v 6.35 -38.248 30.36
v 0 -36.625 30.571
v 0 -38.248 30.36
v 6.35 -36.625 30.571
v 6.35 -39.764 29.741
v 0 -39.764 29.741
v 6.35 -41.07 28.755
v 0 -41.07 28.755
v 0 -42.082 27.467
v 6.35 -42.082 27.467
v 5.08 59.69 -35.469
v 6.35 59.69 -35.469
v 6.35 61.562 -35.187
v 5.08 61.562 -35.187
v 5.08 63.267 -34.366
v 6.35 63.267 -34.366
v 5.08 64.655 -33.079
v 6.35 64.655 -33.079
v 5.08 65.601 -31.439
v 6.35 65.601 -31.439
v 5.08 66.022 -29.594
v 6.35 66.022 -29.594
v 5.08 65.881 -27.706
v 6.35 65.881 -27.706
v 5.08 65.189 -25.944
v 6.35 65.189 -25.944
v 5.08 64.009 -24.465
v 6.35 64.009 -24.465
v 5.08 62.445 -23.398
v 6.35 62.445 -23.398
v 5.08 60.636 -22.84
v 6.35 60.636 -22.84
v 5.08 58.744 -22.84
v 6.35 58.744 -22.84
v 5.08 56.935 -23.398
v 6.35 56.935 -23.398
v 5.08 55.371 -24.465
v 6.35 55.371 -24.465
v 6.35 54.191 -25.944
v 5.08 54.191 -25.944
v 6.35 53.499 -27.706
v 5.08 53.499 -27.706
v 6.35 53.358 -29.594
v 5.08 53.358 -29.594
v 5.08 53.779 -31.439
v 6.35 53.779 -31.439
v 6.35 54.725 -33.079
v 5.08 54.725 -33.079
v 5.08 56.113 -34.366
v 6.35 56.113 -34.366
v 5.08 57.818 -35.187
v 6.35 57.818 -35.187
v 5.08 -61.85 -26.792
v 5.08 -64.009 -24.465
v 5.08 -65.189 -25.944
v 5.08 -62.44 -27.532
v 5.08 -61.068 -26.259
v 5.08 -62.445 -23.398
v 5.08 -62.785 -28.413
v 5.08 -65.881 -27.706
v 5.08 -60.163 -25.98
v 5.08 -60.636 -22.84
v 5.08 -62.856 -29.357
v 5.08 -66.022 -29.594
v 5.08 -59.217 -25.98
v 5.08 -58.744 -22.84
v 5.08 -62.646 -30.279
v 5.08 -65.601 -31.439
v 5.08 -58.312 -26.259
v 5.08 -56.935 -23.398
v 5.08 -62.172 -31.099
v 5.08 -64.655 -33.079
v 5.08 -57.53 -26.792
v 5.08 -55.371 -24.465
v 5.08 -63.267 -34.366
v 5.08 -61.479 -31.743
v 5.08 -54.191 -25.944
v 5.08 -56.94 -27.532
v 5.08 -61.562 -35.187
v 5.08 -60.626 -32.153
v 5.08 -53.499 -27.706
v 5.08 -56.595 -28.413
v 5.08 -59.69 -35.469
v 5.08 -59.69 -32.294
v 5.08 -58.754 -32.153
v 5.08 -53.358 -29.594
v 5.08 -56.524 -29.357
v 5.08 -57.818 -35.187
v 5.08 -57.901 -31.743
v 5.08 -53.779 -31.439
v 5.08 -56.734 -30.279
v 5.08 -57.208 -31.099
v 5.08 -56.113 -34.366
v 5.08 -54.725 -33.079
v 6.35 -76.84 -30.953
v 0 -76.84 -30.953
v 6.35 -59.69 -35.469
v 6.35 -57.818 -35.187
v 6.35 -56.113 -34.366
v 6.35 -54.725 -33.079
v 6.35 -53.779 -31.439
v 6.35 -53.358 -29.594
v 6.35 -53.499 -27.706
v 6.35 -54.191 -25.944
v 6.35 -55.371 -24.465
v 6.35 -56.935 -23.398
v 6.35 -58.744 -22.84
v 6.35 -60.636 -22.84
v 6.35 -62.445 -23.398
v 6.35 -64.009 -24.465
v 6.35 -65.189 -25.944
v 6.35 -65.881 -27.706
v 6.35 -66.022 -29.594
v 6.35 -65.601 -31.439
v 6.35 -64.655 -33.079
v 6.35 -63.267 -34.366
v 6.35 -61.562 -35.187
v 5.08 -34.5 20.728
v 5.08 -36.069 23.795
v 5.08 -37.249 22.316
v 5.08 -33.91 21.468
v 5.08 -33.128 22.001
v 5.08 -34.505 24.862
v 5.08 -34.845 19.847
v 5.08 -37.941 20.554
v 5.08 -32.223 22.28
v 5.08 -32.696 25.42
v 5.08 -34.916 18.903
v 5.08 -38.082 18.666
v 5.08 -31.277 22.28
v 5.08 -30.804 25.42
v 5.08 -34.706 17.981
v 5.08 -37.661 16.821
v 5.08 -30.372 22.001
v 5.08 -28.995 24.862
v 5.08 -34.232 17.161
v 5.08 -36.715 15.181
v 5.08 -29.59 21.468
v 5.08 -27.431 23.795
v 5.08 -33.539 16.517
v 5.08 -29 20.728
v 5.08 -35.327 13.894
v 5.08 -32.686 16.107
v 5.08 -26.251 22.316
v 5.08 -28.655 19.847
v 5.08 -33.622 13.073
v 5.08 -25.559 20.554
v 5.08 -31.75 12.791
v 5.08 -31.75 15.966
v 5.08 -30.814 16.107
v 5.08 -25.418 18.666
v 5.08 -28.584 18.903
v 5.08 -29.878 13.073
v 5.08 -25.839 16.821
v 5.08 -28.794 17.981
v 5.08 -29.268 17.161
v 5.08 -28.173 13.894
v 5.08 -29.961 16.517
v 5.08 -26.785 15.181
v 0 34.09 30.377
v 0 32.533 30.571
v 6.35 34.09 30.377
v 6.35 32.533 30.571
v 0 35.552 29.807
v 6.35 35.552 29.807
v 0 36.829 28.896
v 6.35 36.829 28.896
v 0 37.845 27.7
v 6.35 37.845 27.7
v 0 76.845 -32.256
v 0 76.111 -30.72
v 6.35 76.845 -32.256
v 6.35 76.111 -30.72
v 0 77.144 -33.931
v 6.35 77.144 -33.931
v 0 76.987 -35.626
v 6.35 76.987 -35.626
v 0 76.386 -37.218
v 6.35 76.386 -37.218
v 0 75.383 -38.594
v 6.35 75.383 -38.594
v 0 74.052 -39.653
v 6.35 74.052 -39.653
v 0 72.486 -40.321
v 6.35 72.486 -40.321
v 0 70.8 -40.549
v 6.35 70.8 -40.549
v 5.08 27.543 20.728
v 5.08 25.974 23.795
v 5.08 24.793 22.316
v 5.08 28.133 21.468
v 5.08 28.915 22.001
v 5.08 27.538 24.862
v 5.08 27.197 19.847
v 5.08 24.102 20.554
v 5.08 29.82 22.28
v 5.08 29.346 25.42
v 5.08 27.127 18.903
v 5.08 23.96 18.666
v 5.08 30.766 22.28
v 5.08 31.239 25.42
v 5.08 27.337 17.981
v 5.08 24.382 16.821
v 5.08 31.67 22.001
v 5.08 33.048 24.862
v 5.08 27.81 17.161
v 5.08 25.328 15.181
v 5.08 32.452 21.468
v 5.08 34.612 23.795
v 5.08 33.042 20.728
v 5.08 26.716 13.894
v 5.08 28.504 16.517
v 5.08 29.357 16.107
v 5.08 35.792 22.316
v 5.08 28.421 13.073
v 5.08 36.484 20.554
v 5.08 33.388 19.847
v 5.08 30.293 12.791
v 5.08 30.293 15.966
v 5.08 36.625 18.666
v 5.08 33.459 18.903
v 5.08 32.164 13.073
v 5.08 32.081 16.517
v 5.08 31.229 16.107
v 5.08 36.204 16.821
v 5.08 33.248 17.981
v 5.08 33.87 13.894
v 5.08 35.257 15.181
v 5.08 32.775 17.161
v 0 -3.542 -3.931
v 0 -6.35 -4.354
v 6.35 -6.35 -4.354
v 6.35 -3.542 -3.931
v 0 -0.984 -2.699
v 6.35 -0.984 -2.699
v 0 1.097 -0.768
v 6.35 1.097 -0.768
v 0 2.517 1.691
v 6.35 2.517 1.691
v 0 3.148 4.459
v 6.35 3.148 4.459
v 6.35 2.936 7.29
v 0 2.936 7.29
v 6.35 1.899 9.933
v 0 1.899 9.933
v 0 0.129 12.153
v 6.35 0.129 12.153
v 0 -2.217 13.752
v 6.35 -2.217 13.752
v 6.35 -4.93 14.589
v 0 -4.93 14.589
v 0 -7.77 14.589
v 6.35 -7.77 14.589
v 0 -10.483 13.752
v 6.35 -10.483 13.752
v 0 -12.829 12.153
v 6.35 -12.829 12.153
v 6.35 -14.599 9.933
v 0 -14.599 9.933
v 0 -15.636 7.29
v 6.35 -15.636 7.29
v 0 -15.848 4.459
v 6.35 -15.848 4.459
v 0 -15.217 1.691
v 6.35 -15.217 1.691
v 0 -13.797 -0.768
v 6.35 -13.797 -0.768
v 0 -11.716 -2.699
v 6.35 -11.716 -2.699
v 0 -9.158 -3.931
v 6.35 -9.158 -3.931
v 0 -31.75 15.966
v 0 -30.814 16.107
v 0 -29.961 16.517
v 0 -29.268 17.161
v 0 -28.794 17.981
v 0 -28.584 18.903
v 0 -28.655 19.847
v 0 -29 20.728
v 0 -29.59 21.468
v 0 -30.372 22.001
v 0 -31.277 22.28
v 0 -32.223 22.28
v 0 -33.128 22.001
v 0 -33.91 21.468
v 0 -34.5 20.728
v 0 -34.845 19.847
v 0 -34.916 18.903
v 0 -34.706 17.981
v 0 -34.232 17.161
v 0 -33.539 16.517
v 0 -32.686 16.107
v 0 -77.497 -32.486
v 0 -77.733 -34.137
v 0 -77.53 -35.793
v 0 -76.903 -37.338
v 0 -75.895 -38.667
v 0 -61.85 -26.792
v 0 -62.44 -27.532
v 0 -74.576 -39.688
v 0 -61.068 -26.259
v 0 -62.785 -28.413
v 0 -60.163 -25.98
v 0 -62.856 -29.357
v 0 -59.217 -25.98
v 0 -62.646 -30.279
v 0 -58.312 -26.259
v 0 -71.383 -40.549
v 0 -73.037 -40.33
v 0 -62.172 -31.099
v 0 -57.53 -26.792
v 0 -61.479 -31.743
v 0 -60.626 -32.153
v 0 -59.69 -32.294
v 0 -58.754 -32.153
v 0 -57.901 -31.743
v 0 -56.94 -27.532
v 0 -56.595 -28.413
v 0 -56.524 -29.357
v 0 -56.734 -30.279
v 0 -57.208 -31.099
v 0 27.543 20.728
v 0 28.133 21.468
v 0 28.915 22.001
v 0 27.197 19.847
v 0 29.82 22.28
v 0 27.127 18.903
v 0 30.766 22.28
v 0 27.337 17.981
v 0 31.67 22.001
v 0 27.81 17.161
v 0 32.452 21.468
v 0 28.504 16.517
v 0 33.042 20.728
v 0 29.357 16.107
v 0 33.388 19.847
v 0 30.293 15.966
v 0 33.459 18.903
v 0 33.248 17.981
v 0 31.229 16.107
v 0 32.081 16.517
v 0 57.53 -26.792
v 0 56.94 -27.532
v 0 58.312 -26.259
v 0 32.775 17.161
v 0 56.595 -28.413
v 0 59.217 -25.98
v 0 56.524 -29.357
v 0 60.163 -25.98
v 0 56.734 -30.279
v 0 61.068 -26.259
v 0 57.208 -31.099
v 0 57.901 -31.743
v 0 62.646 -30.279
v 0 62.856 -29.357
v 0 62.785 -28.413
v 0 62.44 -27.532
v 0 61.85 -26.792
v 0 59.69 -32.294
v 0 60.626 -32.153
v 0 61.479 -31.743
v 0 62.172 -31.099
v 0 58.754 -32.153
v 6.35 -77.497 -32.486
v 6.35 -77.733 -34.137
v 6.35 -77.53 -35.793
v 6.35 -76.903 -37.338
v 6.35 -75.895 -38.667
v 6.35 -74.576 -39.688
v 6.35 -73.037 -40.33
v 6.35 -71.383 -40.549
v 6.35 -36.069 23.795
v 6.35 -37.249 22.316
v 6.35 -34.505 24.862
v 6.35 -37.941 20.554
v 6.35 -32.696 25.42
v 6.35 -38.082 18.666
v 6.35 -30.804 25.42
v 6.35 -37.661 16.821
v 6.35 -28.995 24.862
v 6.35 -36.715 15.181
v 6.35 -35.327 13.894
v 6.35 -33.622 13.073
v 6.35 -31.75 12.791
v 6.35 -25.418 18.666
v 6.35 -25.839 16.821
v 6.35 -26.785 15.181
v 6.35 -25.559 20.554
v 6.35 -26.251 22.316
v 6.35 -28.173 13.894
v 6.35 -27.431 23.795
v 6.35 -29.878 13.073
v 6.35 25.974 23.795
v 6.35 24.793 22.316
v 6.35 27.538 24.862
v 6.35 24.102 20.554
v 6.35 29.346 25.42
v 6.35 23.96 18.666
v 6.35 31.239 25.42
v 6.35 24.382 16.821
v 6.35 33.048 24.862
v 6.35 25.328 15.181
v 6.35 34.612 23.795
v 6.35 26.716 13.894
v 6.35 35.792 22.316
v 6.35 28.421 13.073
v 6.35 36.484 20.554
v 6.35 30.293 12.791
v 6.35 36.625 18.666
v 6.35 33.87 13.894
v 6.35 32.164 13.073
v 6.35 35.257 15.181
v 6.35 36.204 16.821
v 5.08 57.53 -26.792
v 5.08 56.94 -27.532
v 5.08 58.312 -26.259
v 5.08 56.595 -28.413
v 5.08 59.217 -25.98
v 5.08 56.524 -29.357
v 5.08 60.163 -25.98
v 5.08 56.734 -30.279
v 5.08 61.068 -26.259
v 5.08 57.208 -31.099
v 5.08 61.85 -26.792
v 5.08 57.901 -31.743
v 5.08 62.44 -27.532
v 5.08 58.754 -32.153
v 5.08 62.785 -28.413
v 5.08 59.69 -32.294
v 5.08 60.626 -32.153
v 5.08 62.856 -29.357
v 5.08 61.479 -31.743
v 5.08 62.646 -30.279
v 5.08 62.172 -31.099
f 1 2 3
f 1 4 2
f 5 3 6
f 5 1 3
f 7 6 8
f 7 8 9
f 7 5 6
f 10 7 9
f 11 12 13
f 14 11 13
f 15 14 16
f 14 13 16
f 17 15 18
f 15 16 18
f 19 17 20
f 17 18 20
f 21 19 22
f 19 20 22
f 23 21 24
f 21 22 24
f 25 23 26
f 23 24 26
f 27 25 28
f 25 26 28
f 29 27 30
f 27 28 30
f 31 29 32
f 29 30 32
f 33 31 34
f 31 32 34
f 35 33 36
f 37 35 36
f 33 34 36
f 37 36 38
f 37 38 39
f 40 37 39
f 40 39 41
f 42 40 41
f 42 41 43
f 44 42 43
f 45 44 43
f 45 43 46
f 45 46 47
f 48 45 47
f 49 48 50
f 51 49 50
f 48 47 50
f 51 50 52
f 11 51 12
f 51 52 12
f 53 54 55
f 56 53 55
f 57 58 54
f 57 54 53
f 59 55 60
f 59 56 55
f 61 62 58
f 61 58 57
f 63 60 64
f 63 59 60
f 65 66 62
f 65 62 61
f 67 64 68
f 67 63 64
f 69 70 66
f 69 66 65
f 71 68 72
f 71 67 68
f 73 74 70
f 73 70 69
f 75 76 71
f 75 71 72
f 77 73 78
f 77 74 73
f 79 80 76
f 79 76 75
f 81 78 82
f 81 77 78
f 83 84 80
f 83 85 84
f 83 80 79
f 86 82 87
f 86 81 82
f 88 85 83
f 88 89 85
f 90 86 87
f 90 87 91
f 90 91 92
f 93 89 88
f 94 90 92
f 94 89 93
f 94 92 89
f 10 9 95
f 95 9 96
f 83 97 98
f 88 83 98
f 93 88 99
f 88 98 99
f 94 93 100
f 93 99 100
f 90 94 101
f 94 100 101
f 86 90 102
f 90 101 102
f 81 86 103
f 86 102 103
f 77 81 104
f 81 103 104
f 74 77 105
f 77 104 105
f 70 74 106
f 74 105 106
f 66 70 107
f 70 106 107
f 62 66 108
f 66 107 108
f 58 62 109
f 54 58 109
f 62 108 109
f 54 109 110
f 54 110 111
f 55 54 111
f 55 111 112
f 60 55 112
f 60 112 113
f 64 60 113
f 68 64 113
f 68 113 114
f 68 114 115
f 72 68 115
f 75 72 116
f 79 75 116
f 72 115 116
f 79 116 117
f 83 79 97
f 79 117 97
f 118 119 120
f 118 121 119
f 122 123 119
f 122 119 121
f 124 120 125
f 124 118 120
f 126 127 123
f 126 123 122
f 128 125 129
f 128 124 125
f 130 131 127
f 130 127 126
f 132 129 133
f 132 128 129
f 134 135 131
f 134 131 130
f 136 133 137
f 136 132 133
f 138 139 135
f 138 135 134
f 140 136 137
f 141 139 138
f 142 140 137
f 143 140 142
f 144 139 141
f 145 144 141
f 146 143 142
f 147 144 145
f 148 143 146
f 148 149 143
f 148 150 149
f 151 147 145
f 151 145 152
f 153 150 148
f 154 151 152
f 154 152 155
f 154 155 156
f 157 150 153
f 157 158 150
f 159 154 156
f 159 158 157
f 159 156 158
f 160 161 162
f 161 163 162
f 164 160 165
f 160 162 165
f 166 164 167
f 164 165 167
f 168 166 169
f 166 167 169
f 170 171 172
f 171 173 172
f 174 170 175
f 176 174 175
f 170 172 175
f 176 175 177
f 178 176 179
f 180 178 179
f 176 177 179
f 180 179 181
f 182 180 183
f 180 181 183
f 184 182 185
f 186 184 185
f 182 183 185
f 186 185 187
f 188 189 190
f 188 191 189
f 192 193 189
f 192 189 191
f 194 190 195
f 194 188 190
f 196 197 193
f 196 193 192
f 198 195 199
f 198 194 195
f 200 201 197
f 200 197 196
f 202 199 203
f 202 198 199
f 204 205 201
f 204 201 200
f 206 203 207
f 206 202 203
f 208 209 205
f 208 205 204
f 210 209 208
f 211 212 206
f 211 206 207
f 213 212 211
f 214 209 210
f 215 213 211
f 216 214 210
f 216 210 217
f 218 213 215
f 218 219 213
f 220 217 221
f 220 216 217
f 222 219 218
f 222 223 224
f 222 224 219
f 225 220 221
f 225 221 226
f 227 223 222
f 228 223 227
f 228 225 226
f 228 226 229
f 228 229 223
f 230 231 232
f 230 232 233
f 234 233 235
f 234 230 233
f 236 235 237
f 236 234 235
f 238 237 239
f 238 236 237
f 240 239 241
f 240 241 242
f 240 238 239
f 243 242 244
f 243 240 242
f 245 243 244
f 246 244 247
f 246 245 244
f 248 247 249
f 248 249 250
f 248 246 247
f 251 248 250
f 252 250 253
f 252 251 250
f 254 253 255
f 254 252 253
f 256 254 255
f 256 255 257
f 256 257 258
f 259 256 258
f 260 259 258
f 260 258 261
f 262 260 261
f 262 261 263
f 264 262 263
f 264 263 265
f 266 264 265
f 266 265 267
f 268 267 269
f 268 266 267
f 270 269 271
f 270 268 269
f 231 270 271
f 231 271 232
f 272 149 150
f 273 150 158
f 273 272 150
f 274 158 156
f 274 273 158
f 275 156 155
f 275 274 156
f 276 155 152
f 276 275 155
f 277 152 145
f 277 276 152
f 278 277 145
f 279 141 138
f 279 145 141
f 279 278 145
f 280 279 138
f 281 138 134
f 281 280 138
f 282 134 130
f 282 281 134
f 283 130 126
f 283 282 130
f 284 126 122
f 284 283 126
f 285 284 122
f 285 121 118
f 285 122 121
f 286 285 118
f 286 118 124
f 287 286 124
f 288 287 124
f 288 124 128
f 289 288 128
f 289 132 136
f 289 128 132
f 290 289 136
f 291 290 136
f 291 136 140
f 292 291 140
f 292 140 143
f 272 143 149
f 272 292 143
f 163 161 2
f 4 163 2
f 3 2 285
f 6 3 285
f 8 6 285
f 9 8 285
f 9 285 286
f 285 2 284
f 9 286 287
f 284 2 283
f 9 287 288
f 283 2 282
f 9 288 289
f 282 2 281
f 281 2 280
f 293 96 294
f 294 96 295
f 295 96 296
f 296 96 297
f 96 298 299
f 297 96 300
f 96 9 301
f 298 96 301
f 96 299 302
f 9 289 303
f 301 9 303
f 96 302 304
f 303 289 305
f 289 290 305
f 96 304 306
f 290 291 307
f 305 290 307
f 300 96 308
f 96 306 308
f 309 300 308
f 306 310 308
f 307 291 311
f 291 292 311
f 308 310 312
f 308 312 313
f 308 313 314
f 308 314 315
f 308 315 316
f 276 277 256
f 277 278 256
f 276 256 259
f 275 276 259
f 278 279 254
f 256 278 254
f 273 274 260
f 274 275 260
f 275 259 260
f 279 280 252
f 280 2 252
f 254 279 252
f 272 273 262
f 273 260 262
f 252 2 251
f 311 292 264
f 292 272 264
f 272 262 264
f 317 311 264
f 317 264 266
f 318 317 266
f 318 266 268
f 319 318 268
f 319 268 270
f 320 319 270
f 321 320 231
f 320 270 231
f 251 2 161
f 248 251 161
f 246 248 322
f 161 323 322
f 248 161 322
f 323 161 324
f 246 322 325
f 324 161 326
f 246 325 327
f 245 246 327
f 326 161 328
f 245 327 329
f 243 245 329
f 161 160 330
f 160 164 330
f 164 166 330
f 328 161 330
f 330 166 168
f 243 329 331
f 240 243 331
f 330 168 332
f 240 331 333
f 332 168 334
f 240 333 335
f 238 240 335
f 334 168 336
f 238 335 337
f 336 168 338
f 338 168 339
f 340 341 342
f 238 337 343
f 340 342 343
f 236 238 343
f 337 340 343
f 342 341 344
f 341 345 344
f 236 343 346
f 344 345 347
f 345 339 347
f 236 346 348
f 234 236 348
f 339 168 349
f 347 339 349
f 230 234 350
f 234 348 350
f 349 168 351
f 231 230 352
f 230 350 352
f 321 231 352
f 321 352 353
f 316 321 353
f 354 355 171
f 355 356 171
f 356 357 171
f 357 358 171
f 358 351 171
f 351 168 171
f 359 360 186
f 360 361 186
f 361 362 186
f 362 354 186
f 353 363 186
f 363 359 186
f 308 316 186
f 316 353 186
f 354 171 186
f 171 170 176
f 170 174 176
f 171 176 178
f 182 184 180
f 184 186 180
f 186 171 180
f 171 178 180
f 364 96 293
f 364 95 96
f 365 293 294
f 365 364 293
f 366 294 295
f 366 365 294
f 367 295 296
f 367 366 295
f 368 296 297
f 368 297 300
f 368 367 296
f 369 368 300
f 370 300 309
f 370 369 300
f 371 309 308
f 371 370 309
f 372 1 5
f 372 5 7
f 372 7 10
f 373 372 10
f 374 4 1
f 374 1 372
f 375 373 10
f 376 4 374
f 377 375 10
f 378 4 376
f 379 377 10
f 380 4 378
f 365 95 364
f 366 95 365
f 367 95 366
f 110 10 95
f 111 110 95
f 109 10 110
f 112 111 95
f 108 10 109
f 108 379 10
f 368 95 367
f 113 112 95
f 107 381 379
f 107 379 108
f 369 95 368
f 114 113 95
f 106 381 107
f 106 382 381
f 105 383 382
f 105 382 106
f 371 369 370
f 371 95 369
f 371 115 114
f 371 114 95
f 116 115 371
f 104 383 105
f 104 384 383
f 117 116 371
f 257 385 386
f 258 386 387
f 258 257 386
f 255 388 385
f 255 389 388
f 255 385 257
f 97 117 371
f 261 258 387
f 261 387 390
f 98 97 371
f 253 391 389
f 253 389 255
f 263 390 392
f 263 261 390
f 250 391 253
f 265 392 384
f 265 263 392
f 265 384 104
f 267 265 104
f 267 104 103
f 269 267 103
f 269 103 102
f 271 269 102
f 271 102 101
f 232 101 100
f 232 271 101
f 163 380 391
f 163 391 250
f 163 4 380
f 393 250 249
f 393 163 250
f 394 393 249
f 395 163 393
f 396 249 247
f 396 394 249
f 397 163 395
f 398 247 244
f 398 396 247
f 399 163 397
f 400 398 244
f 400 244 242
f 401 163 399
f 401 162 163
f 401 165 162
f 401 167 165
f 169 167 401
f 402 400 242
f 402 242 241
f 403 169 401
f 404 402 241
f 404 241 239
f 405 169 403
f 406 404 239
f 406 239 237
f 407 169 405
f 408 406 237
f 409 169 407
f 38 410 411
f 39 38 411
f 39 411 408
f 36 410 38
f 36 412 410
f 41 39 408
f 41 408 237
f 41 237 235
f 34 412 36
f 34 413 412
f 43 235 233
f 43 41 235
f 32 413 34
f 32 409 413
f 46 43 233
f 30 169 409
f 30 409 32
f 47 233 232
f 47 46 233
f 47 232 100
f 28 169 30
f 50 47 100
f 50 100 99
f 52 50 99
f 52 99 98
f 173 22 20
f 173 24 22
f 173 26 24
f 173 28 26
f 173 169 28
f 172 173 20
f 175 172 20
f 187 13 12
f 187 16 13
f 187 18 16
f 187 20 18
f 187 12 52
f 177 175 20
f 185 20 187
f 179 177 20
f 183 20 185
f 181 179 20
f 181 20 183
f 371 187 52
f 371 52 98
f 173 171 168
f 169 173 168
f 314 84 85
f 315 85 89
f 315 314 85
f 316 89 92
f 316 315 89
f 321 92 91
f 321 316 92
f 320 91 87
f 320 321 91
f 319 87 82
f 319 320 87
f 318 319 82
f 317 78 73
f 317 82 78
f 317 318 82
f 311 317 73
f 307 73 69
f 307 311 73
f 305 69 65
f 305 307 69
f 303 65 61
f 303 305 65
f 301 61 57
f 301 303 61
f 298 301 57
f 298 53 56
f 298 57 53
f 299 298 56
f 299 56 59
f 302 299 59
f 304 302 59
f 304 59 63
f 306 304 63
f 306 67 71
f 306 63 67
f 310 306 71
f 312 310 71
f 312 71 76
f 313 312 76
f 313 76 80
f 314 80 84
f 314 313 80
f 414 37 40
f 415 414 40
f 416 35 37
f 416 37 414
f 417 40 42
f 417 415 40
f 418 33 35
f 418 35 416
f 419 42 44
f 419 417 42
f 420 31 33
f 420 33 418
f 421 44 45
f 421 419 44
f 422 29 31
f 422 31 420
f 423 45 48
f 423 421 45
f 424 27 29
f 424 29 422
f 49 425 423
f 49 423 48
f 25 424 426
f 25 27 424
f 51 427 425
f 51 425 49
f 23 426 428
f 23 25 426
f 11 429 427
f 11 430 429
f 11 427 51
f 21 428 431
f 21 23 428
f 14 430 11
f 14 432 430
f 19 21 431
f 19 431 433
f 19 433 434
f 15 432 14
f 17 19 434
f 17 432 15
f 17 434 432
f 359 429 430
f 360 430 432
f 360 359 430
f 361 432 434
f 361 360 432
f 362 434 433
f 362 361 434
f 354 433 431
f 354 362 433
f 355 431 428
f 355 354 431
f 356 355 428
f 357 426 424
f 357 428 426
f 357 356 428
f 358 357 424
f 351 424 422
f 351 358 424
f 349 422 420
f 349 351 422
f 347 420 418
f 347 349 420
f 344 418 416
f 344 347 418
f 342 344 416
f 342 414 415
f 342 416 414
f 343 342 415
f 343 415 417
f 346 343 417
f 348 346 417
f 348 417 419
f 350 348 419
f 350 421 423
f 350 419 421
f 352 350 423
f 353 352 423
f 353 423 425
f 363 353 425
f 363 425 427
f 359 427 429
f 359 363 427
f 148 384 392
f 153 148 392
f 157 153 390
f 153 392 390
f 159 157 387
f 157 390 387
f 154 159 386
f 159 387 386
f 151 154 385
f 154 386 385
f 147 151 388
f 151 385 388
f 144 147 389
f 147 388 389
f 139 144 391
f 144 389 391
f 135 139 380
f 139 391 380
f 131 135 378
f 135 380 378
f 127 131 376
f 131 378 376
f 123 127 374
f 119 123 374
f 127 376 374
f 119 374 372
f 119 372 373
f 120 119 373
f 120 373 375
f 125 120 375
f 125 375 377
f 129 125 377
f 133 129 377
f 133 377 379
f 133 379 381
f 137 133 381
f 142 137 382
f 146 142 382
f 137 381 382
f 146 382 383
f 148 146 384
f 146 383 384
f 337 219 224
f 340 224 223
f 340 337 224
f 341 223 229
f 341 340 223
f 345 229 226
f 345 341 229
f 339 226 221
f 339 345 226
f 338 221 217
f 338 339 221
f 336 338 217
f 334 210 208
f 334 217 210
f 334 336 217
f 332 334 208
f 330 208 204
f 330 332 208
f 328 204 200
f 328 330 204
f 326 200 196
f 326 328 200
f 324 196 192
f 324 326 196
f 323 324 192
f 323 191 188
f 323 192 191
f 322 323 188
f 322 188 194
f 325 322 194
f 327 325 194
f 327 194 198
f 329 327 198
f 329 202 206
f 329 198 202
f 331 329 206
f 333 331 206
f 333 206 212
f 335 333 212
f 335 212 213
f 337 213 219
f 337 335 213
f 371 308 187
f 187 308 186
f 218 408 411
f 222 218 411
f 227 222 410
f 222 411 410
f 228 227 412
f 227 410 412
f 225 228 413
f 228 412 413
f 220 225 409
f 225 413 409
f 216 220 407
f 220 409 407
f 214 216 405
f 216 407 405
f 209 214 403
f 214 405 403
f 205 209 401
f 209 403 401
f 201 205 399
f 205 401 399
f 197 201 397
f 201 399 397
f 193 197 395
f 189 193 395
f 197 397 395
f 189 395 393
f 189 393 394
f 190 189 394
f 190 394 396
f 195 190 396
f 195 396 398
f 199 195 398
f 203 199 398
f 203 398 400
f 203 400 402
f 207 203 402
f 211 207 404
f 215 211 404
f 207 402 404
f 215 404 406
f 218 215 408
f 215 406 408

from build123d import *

# Parameters (mm, degrees)
SKETCH2_R           = 3.175
SKETCH2_R_2         = 9.525
BOSS_EXTRUDE1_DEPTH = 6.35
SKETCH3_R           = 6.35
CUT_EXTRUDE1_DEPTH  = 1.27
FILLET1_R           = 6.35


with BuildPart() as part:
    # Sketch2 → Boss-Extrude1 (new body)
    with BuildSketch(Plane(origin=(0, 0, 0), x_dir=(0, 0, -1), z_dir=(1, 0, 0))):
        Polygon((-30.570599259, 35.964413408), (-30.570599259, -40.235586592), (40.549400741, -82.55), (40.549400741, 82.55), align=None)
        with Locations((29.119400741, 59.69)):
            Circle(SKETCH2_R, mode=Mode.SUBTRACT)
        with Locations((-19.140599259, 30.292732622)):
            Circle(SKETCH2_R, mode=Mode.SUBTRACT)
        with Locations((29.119400741, -59.69)):
            Circle(SKETCH2_R, mode=Mode.SUBTRACT)
        with Locations((-19.140599259, -31.75)):
            Circle(SKETCH2_R, mode=Mode.SUBTRACT)
        with Locations((-5.170599259, -6.35)):
            Circle(SKETCH2_R_2, mode=Mode.SUBTRACT)
    extrude(amount=BOSS_EXTRUDE1_DEPTH)

    # Sketch3 → Cut-Extrude1 (cut)
    with BuildSketch(Plane(origin=(6.35, 0, 0), x_dir=(0, 0, -1), z_dir=(1, 0, 0))):
        with Locations((-19.140599259, 30.292732622)):
            Circle(SKETCH3_R)
        with Locations((29.119400741, 59.69)):
            Circle(SKETCH3_R)
        with Locations((-19.140599259, -31.75)):
            Circle(SKETCH3_R)
        with Locations((29.119400741, -59.69)):
            Circle(SKETCH3_R)
    extrude(amount=-CUT_EXTRUDE1_DEPTH, mode=Mode.SUBTRACT)

    # Fillet1
    fillet1_edges = [part.edges().sort_by_distance(p)[0] for p in [
        (3.175, 82.55, -40.549400741),
        (3.175, -82.55, -40.549400741),
        (3.175, -40.235586592, 30.570599259),
        (3.175, 35.964413408, 30.570599259),
    ]]
    fillet(fillet1_edges, radius=FILLET1_R)


solid = part.part
